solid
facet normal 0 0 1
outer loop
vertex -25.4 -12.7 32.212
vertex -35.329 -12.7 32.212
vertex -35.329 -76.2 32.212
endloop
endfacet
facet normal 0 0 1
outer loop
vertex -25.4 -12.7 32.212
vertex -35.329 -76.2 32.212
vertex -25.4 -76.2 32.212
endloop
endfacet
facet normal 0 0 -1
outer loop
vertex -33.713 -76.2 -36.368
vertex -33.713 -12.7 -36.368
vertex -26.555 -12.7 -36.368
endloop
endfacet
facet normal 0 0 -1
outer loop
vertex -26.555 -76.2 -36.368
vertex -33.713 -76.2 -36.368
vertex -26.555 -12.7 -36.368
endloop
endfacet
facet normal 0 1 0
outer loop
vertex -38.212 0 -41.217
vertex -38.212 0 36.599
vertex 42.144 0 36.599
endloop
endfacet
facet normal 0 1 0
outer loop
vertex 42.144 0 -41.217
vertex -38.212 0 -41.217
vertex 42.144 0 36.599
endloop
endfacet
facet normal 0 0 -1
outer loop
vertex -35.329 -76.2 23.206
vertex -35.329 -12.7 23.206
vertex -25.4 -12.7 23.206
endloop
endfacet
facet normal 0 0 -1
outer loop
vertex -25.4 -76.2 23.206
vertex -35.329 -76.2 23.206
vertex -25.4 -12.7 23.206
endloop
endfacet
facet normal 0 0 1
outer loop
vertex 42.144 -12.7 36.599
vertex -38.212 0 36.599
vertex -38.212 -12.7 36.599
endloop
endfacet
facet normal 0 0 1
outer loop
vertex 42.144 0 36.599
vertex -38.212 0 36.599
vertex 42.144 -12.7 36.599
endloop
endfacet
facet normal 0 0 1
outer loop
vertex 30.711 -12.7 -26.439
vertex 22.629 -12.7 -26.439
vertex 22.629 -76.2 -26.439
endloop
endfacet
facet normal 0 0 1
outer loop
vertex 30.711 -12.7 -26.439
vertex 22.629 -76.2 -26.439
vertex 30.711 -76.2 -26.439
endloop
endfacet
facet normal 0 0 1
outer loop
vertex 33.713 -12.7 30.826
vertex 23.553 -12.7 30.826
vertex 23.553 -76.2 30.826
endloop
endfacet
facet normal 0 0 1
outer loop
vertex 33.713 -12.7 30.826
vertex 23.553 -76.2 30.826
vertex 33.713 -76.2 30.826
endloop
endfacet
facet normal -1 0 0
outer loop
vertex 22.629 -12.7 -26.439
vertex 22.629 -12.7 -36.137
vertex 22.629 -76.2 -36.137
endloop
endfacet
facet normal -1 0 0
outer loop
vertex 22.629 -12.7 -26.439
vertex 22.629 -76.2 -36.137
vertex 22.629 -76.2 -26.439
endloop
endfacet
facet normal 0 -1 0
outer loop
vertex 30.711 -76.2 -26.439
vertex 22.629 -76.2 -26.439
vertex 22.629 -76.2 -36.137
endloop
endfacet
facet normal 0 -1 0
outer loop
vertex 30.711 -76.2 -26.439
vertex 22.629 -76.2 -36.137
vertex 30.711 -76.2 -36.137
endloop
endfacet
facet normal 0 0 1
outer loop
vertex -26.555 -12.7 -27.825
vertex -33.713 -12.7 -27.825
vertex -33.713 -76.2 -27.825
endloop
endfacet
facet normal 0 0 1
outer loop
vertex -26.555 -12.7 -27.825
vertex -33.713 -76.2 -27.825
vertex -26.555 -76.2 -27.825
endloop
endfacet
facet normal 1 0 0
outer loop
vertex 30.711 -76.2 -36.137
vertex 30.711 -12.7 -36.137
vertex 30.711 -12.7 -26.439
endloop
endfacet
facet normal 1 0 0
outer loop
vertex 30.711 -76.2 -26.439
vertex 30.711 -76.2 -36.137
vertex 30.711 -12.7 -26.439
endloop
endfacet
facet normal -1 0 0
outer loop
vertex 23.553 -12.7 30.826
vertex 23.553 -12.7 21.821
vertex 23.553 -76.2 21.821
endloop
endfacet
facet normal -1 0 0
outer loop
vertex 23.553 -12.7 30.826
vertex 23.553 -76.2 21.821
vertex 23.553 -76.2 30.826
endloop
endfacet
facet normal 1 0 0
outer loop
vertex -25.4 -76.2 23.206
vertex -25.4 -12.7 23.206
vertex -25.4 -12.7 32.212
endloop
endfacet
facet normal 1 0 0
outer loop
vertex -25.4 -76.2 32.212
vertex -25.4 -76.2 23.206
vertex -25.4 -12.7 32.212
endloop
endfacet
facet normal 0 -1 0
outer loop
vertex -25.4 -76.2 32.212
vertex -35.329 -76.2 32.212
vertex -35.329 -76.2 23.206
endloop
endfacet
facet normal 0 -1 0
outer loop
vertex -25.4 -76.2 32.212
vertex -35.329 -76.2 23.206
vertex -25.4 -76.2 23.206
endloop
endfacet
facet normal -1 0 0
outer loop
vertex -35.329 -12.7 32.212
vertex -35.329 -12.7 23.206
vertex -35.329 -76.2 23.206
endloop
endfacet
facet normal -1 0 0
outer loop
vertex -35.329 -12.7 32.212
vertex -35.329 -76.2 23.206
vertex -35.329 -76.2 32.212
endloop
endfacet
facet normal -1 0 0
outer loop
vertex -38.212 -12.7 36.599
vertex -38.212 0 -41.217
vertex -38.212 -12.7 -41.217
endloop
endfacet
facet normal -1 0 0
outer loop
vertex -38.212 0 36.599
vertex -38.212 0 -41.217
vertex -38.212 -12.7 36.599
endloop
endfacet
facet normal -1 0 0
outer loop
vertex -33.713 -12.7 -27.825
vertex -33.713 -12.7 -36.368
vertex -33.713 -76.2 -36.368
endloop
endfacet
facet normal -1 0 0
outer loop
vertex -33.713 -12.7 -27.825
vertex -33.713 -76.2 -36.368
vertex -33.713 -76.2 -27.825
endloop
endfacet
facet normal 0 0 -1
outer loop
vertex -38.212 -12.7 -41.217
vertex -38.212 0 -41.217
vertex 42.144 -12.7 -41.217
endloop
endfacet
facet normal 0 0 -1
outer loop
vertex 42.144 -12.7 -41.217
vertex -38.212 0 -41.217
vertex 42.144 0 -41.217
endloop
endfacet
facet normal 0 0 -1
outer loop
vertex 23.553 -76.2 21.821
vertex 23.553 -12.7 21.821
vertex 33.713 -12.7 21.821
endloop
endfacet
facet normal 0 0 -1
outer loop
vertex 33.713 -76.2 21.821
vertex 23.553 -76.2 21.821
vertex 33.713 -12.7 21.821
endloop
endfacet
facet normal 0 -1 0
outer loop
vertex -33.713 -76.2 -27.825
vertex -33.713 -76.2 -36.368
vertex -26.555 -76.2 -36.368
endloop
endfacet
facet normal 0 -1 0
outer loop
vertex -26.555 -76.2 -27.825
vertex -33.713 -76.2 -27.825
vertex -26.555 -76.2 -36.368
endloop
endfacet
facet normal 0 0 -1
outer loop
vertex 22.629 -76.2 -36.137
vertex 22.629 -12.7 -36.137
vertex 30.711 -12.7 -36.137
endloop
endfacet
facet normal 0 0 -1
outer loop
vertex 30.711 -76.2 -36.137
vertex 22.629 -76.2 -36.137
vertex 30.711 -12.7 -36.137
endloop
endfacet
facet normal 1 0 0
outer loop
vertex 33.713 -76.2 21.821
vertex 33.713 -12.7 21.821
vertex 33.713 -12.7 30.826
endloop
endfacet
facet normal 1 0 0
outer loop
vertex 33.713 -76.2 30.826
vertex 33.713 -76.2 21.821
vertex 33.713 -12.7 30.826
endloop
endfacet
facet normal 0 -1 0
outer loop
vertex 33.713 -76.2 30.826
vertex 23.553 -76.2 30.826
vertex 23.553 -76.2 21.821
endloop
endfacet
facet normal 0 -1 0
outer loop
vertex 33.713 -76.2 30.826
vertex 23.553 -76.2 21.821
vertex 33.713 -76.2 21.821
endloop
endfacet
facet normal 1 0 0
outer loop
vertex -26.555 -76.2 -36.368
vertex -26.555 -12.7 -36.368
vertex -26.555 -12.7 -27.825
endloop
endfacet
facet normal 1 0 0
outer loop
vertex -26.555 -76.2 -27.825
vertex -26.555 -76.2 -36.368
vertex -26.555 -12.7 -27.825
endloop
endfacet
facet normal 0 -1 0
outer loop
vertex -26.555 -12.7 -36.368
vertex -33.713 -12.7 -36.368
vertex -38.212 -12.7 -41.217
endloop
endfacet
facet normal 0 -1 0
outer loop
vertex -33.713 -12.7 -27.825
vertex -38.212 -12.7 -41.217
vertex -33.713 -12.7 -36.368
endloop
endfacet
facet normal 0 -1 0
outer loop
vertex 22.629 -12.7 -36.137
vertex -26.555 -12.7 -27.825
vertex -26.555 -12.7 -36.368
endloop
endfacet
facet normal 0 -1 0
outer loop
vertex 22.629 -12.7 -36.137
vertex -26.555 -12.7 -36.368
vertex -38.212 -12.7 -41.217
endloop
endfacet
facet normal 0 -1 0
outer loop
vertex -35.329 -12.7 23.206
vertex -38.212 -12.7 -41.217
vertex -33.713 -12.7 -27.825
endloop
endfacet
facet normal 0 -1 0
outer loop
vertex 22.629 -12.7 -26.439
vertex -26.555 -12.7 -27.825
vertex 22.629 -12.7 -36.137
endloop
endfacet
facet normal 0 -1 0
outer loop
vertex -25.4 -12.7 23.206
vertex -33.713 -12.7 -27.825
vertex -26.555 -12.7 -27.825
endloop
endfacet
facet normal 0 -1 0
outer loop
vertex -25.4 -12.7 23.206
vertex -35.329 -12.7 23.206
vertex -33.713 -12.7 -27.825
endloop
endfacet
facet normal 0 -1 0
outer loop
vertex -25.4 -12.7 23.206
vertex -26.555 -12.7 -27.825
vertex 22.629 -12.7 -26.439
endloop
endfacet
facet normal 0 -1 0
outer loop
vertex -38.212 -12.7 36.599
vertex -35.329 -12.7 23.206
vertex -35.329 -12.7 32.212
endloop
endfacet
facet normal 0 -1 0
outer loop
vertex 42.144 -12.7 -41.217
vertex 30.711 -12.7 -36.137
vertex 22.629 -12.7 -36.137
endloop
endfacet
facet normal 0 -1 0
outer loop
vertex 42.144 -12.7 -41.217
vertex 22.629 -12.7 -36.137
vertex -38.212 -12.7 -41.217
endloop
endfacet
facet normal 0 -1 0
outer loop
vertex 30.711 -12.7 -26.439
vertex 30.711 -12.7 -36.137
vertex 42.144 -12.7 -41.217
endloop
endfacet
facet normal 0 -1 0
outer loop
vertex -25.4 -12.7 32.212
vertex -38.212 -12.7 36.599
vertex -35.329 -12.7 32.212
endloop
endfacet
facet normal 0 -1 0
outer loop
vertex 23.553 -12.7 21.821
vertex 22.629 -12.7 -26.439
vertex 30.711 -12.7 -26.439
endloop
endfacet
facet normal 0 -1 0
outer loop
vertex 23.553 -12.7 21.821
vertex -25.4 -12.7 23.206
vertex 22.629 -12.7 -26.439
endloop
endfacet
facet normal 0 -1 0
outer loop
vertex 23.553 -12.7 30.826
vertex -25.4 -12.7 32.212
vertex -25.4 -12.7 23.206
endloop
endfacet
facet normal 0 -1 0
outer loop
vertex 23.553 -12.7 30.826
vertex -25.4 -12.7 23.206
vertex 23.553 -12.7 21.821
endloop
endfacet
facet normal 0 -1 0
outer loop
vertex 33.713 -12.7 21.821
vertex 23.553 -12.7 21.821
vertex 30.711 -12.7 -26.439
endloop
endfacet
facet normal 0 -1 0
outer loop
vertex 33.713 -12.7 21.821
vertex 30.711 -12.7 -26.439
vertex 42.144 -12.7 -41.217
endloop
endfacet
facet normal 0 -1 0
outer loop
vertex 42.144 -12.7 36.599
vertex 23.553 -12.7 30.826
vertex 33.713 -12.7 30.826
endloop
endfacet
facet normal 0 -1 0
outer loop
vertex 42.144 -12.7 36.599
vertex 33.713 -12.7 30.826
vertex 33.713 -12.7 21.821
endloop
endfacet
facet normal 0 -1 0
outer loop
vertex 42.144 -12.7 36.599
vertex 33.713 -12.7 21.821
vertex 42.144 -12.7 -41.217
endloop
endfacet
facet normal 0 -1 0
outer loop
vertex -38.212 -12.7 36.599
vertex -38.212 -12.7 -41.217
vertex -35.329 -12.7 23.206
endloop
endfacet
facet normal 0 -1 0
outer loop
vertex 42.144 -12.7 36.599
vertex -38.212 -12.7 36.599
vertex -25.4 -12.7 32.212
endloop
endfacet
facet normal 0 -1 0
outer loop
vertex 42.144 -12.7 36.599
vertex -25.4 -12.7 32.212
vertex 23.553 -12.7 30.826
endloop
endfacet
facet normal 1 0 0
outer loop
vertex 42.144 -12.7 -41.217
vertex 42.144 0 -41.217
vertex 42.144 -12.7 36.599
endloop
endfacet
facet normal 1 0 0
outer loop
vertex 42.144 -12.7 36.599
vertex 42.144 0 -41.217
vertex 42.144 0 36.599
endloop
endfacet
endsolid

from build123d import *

# Parameters (mm, degrees)
F0_W     = 80.35636
F0_H     = 77.816363
F1_DEPTH = 12.7
F2_W     = 9.929092
F2_H     = 9.005454
F3_DEPTH = 76.2
F4_W     = 10.160005
F4_H     = 9.005454
F5_DEPTH = 76.2
F6_W     = 7.158185
F6_H     = 8.543637
F7_DEPTH = 76.2
F8_W     = 8.081818
F8_H     = 9.698183
F9_DEPTH = 76.2


with BuildPart() as f1:
    # F0 (on Front) → F1 (new body)
    with BuildSketch(Plane.XZ):
        with Locations((1.965884, -2.309089)):
            Rectangle(F0_W, F0_H)
    extrude(amount=F1_DEPTH)

    # F2 (on Front) → F3 (join)
    with BuildSketch(Plane.XZ):
        with Locations((-30.364546, 27.709091)):
            Rectangle(F2_W, F2_H)
    extrude(amount=F3_DEPTH)

    # F4 (on Front) → F5 (join)
    with BuildSketch(Plane.XZ):
        with Locations((28.632728, 26.323637)):
            Rectangle(F4_W, F4_H)
    extrude(amount=F5_DEPTH)

    # F6 (on Front) → F7 (join)
    with BuildSketch(Plane.XZ):
        with Locations((-30.133637, -32.096365)):
            Rectangle(F6_W, F6_H)
    extrude(amount=F7_DEPTH)

    # F8 (on Front) → F9 (join)
    with BuildSketch(Plane.XZ):
        with Locations((26.670001, -31.28818)):
            Rectangle(F8_W, F8_H)
    extrude(amount=F9_DEPTH)


solid = f1.part
